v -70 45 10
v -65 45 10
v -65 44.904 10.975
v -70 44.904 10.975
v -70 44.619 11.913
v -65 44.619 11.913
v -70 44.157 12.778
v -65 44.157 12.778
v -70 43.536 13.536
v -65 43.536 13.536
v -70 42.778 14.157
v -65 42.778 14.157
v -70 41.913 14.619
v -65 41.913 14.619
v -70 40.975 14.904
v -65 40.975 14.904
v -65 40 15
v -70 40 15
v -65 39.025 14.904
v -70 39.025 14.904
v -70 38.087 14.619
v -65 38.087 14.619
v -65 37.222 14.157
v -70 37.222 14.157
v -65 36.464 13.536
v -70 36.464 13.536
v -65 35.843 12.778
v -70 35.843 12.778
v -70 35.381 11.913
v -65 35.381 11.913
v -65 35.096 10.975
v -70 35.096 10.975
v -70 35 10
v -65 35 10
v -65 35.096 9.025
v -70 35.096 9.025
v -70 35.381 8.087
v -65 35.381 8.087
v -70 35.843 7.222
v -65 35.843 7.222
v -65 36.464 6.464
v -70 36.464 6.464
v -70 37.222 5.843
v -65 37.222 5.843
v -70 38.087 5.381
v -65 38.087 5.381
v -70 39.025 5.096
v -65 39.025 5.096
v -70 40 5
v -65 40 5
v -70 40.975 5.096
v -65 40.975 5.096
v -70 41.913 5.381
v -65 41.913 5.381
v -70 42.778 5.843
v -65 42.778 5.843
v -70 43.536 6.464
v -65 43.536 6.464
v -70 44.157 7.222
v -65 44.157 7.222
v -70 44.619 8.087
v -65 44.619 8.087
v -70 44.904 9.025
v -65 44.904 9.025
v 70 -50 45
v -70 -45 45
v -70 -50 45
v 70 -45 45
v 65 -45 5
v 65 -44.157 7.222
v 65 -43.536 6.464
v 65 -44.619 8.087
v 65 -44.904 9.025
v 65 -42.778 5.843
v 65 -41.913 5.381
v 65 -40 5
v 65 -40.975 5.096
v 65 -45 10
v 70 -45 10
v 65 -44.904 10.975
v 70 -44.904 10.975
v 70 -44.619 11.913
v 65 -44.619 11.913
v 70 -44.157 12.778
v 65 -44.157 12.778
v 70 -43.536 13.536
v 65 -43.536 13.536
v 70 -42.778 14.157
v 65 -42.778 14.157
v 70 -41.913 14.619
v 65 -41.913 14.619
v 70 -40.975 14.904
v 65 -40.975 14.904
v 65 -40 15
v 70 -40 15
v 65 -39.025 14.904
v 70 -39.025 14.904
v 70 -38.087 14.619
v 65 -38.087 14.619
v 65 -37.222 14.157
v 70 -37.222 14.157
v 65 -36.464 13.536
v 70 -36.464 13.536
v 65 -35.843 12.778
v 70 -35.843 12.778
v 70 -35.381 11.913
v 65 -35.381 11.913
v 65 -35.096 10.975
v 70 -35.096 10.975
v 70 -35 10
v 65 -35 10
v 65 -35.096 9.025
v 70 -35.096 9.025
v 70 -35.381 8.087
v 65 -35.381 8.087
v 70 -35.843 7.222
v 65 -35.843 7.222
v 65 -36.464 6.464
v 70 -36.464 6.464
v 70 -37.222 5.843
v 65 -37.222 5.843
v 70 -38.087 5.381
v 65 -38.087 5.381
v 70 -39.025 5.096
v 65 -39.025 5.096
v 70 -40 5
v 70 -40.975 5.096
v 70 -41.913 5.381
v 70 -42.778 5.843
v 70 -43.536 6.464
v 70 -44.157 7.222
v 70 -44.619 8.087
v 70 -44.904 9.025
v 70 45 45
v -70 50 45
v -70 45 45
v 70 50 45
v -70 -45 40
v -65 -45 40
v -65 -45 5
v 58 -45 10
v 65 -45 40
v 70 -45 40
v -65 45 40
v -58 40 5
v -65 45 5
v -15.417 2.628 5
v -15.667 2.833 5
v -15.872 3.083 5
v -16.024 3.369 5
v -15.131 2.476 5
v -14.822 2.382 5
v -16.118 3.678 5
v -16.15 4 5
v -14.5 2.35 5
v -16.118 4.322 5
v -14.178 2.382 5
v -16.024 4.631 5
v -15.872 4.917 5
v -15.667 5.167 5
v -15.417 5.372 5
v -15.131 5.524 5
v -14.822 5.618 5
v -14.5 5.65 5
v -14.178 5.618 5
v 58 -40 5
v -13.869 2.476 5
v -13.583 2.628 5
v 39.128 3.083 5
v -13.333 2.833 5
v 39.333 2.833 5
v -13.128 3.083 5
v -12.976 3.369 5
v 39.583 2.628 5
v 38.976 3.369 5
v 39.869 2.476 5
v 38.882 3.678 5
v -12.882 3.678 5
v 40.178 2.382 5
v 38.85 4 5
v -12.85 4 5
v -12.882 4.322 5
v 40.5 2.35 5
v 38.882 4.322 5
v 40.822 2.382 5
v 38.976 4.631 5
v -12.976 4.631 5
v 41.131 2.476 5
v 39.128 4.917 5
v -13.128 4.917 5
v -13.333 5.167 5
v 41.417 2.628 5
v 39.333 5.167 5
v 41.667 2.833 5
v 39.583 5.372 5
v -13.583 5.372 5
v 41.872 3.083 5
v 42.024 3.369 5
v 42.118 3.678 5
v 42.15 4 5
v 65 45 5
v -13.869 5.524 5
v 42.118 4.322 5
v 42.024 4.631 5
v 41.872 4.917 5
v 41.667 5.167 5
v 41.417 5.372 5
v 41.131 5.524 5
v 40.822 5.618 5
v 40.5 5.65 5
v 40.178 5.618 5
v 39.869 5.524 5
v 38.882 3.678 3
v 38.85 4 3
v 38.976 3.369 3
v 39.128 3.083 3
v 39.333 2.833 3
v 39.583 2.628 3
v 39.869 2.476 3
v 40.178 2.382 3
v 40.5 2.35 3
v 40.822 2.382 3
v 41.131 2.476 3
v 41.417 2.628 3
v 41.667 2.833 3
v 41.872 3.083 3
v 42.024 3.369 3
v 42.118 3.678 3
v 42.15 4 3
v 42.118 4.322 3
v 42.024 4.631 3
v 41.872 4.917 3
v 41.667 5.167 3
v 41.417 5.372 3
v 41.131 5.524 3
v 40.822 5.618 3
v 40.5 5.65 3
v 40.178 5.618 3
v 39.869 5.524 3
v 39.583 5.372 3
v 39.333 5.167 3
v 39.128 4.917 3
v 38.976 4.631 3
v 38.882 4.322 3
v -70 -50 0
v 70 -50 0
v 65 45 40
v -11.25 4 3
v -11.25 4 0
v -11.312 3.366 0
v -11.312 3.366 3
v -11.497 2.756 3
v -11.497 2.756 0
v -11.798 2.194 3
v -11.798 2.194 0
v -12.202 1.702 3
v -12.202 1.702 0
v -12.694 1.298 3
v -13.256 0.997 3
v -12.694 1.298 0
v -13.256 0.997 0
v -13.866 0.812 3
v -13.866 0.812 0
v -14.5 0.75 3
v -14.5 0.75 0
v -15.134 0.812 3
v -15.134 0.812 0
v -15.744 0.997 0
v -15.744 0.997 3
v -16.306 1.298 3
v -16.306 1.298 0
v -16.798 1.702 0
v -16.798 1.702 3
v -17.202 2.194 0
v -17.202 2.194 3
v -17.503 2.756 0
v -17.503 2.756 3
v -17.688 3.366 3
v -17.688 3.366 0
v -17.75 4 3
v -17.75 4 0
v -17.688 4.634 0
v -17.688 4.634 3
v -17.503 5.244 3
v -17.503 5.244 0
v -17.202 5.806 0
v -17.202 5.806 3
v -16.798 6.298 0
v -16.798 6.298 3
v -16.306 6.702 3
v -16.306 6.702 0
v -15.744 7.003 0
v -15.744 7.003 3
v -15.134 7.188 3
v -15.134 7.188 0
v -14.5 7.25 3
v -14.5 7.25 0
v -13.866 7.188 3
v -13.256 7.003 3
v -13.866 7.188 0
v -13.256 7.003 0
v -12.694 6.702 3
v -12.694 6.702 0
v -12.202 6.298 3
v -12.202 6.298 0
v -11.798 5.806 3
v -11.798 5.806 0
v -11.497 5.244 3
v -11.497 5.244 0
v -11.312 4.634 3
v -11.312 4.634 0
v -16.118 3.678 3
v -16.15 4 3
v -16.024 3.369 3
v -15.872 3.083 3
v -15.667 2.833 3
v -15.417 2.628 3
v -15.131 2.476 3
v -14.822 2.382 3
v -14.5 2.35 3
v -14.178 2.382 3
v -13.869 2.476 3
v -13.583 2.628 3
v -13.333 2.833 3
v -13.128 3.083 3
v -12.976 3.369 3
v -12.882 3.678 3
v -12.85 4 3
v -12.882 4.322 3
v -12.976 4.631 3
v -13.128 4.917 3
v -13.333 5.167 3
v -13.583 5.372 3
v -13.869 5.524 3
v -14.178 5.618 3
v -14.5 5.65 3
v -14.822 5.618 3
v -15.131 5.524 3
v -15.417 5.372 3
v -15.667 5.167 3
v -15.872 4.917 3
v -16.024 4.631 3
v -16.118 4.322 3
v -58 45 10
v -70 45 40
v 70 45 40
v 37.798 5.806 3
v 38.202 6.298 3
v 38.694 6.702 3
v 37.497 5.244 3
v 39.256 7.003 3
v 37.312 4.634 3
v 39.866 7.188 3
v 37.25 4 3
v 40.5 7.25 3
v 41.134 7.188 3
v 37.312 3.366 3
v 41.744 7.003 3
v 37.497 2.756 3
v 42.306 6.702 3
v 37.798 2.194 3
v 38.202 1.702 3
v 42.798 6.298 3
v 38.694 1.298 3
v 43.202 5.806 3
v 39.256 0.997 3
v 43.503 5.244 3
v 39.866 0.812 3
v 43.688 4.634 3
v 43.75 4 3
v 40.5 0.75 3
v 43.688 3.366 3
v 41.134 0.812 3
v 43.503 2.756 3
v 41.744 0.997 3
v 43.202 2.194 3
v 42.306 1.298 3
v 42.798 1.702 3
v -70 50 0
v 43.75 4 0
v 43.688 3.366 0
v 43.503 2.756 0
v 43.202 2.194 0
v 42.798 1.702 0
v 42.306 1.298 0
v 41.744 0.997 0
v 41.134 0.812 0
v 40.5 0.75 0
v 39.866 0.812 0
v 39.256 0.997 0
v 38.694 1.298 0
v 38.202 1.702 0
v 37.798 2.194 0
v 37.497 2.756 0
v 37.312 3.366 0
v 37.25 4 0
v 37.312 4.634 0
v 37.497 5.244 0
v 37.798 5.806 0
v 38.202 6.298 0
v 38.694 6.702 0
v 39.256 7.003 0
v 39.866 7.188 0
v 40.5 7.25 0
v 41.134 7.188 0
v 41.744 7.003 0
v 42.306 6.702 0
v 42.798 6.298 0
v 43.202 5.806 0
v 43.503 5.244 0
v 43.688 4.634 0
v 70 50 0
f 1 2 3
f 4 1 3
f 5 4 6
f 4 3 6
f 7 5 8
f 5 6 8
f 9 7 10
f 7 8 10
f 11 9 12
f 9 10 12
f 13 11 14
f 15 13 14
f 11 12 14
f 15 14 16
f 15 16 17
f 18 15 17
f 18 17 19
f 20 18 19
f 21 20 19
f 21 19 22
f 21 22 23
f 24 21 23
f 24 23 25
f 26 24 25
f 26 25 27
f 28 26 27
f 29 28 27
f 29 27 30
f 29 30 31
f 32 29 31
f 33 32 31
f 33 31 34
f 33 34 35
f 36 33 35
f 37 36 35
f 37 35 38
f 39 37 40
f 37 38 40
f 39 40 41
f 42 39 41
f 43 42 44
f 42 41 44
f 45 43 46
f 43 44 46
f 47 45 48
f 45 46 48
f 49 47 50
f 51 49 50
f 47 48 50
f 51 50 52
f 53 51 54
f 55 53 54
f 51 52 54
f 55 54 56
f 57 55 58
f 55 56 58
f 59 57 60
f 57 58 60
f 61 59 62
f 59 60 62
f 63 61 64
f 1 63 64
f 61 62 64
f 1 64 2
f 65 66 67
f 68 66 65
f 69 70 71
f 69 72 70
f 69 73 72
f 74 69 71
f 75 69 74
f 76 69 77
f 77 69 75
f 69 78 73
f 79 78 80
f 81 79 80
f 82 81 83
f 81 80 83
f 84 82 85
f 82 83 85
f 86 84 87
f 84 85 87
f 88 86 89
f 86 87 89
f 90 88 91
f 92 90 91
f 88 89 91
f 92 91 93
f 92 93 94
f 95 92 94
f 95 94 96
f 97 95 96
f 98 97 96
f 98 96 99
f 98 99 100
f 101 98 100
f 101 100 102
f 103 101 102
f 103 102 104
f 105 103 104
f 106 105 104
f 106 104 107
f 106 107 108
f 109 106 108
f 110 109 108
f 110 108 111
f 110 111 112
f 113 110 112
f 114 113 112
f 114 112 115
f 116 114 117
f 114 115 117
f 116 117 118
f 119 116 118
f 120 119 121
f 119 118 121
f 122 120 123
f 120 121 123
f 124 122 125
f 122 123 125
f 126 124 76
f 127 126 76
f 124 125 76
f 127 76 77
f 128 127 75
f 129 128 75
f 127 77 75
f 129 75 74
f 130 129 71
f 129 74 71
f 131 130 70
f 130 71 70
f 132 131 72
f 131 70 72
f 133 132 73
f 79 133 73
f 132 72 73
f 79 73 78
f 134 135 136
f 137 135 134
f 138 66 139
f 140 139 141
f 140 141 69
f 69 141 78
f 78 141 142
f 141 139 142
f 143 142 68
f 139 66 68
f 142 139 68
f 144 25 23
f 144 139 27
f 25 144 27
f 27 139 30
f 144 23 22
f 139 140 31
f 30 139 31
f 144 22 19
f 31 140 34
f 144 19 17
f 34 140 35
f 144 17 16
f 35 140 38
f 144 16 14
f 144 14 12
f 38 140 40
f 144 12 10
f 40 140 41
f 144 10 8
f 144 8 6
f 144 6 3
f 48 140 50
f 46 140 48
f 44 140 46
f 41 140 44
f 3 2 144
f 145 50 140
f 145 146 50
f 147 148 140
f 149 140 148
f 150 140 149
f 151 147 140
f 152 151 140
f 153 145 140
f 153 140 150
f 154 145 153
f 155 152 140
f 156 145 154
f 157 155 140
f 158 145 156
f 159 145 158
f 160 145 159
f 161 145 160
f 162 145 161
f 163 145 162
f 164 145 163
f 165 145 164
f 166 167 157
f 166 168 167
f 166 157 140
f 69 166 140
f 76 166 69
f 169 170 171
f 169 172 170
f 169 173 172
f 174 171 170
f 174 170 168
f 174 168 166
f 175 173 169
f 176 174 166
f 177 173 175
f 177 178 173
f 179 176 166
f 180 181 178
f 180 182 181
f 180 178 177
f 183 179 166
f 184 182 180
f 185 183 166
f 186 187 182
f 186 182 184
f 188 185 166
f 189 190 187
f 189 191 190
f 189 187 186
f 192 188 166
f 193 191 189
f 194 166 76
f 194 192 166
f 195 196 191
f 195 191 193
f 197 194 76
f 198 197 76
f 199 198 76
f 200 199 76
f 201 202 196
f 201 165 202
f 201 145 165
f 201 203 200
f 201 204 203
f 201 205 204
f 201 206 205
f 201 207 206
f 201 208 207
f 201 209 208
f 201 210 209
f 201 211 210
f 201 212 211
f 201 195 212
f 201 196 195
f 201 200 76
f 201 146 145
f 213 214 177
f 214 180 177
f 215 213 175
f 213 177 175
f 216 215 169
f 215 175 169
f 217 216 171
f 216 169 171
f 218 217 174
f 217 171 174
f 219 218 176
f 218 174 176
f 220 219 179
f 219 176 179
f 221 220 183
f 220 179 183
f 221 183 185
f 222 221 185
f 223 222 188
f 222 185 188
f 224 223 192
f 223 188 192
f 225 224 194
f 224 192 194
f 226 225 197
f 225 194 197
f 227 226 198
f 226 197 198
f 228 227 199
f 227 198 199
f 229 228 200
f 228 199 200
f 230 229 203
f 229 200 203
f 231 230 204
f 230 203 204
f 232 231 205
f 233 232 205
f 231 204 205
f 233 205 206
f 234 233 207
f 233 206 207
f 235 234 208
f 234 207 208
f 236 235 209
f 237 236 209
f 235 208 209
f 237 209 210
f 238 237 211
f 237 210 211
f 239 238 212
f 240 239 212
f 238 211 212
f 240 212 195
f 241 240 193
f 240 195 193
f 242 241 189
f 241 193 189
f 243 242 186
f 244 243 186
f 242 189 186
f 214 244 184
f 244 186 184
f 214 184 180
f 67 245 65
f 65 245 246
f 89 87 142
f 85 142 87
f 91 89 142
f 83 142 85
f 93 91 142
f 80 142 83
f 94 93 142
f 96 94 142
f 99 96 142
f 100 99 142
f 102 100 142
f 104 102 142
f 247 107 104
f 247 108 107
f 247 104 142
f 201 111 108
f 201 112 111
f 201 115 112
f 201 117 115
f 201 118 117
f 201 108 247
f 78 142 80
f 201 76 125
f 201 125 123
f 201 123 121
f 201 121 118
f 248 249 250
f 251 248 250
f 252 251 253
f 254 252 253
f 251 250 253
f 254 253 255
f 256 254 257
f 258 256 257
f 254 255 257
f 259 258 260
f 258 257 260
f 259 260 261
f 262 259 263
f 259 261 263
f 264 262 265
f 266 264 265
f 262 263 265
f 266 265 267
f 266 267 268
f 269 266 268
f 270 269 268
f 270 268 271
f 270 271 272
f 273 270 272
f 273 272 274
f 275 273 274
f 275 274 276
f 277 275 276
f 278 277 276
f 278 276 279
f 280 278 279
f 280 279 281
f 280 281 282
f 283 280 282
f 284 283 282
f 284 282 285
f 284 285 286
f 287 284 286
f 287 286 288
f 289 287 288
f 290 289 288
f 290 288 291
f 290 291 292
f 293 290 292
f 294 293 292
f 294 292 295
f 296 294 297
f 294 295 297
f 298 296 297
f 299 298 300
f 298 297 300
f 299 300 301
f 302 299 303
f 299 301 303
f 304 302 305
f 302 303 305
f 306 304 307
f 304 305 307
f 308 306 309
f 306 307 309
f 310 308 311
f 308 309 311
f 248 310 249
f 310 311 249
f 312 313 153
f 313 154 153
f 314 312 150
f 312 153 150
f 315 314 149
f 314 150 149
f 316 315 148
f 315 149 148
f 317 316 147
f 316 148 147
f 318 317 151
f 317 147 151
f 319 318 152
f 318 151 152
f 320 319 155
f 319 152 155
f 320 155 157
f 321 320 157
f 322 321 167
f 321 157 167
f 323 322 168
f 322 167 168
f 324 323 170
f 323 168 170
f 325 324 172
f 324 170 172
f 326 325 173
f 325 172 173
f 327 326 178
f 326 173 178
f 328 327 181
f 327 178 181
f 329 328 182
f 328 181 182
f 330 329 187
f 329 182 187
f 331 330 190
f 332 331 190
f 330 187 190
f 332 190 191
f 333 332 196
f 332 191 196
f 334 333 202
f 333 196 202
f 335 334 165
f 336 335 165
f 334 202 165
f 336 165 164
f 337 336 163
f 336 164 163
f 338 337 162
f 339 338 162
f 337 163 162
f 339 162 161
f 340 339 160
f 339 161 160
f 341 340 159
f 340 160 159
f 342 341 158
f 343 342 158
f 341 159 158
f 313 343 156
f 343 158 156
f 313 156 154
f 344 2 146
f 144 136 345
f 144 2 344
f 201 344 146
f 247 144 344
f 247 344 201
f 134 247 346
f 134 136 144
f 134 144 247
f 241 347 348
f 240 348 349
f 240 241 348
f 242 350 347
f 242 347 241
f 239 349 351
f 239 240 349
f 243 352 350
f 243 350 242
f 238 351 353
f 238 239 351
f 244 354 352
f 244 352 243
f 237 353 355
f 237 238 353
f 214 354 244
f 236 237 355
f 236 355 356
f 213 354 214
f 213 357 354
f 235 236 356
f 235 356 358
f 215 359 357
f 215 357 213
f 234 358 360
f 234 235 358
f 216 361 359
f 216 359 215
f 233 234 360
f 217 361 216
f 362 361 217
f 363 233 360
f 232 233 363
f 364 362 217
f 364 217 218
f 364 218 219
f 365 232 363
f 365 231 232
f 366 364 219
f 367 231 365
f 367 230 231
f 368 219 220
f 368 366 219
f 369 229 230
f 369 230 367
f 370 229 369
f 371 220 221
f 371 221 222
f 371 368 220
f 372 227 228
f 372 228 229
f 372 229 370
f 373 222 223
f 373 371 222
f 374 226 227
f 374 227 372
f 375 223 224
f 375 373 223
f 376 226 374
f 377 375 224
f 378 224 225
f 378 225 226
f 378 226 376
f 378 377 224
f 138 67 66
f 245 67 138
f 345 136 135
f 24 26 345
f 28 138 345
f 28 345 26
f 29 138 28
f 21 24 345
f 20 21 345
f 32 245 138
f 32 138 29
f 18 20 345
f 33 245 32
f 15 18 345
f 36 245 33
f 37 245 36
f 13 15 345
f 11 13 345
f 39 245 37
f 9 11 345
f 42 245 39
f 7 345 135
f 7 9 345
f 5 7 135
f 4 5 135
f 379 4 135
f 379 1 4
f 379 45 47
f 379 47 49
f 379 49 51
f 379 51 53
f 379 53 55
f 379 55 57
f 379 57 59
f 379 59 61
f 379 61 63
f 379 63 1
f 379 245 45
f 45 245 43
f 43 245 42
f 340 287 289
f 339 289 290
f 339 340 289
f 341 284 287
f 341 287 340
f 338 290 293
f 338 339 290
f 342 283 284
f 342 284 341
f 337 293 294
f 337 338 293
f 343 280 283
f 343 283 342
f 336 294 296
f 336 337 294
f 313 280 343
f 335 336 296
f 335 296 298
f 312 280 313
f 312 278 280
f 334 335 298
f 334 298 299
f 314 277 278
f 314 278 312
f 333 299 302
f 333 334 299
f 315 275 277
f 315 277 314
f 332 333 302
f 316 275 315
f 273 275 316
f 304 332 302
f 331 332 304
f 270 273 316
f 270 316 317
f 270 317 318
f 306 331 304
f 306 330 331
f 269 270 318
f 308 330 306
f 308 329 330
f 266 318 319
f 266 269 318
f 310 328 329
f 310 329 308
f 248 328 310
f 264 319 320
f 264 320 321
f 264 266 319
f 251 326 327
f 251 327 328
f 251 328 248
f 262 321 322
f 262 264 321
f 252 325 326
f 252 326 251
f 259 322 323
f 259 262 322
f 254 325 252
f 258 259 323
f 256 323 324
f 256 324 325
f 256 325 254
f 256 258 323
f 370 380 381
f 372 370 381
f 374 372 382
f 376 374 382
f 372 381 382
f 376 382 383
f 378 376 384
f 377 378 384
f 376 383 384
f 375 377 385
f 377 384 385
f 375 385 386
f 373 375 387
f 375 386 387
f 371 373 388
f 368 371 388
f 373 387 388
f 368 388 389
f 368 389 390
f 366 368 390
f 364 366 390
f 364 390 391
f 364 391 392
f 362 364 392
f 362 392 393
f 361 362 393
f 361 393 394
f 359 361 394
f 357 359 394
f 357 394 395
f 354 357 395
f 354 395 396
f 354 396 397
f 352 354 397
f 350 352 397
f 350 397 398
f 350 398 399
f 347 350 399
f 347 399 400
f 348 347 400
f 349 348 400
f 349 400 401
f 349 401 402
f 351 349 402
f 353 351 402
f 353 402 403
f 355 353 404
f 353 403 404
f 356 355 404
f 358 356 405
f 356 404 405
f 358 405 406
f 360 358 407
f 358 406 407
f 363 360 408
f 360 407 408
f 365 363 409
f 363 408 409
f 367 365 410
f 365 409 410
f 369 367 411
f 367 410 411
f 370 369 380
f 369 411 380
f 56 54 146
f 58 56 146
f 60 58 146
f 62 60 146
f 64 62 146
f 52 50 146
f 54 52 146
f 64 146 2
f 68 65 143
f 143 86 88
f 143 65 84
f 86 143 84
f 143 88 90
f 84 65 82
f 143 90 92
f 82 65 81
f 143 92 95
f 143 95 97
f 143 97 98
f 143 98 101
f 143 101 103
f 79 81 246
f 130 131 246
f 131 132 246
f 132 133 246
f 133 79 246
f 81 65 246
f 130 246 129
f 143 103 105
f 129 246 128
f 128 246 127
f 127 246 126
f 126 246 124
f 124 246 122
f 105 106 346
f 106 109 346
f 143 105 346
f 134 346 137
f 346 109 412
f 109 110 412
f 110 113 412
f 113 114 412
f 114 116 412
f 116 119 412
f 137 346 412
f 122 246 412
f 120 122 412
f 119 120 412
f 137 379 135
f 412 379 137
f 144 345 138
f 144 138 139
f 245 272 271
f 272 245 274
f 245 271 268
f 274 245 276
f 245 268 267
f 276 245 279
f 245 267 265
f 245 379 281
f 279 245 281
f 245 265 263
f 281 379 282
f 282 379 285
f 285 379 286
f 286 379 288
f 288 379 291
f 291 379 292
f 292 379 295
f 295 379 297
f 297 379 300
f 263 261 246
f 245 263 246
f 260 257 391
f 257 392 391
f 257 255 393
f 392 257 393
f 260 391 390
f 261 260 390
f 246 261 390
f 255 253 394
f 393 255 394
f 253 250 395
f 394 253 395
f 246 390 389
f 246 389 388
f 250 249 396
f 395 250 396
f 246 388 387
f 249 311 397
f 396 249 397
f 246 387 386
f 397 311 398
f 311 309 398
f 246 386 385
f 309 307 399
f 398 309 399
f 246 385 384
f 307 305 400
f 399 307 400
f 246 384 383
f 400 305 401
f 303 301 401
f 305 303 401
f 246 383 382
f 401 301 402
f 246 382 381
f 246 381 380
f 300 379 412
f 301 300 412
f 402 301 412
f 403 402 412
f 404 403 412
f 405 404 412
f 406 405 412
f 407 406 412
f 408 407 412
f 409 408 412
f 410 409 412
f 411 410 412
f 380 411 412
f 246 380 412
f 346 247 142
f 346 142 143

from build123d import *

# Parameters (mm, degrees)
F0_W           = 140
F0_H           = 100
F1_DEPTH       = 5
F2_W           = 140
F2_H           = 100
F2_W_2         = 130
F2_H_2         = 90
F3_DEPTH       = 40
F5_D           = 3.3
F5_CBORE_D     = 6.5
F5_CBORE_DEPTH = 3
F7_D           = 10
F7_DEPTH       = 12
F7_TIP         = 3.0043030951
F9_D           = 10
F9_DEPTH       = 12
F9_TIP         = 3.0043030951
F10_W          = 5
F10_H          = 90
F11_DEPTH      = 5


with BuildPart() as f1:
    # F0 (on Top) → F1 (new body)
    with BuildSketch(Plane.XY):
        Rectangle(F0_W, F0_H)
    extrude(amount=F1_DEPTH)

    # F2 (on face) → F3 (join)
    with BuildSketch(Plane.XY.offset(5)):
        Rectangle(F2_W, F2_H)
        Rectangle(F2_W_2, F2_H_2, mode=Mode.SUBTRACT)
    extrude(amount=F3_DEPTH)

    # F5 (through all)
    with Locations(Plane(origin=(0, 0, 0), x_dir=(1, 0, 0), z_dir=(0, 0, -1))):
        with Locations((40.5, -4), (-14.5, -4)):
            CounterBoreHole(F5_D / 2, F5_CBORE_D / 2, F5_CBORE_DEPTH)

    # F7
    with Locations(Plane.YZ.offset(70)):
        with Locations((-40, 10)):
            Hole(F7_D / 2, depth=F7_DEPTH)
            with Locations((0, 0, -(F7_DEPTH + F7_TIP / 2))):  # 118° drill point
                Cone(0, F7_D / 2, F7_TIP, mode=Mode.SUBTRACT)

    # F9
    with Locations(Plane(origin=(-70, 0, 0), x_dir=(0, -1, 0), z_dir=(-1, 0, 0))):
        with Locations((-40, 10)):
            Hole(F9_D / 2, depth=F9_DEPTH)
            with Locations((0, 0, -(F9_DEPTH + F9_TIP / 2))):  # 118° drill point
                Cone(0, F9_D / 2, F9_TIP, mode=Mode.SUBTRACT)

    # F10 (on face) → F11 (cut)
    with BuildSketch(Plane.XY.offset(45)):
        with Locations((-67.5, 0)):
            Rectangle(F10_W, F10_H)
        with Locations((67.5, 0)):
            Rectangle(F10_W, F10_H)
    extrude(amount=-F11_DEPTH, mode=Mode.SUBTRACT)


solid = f1.part
